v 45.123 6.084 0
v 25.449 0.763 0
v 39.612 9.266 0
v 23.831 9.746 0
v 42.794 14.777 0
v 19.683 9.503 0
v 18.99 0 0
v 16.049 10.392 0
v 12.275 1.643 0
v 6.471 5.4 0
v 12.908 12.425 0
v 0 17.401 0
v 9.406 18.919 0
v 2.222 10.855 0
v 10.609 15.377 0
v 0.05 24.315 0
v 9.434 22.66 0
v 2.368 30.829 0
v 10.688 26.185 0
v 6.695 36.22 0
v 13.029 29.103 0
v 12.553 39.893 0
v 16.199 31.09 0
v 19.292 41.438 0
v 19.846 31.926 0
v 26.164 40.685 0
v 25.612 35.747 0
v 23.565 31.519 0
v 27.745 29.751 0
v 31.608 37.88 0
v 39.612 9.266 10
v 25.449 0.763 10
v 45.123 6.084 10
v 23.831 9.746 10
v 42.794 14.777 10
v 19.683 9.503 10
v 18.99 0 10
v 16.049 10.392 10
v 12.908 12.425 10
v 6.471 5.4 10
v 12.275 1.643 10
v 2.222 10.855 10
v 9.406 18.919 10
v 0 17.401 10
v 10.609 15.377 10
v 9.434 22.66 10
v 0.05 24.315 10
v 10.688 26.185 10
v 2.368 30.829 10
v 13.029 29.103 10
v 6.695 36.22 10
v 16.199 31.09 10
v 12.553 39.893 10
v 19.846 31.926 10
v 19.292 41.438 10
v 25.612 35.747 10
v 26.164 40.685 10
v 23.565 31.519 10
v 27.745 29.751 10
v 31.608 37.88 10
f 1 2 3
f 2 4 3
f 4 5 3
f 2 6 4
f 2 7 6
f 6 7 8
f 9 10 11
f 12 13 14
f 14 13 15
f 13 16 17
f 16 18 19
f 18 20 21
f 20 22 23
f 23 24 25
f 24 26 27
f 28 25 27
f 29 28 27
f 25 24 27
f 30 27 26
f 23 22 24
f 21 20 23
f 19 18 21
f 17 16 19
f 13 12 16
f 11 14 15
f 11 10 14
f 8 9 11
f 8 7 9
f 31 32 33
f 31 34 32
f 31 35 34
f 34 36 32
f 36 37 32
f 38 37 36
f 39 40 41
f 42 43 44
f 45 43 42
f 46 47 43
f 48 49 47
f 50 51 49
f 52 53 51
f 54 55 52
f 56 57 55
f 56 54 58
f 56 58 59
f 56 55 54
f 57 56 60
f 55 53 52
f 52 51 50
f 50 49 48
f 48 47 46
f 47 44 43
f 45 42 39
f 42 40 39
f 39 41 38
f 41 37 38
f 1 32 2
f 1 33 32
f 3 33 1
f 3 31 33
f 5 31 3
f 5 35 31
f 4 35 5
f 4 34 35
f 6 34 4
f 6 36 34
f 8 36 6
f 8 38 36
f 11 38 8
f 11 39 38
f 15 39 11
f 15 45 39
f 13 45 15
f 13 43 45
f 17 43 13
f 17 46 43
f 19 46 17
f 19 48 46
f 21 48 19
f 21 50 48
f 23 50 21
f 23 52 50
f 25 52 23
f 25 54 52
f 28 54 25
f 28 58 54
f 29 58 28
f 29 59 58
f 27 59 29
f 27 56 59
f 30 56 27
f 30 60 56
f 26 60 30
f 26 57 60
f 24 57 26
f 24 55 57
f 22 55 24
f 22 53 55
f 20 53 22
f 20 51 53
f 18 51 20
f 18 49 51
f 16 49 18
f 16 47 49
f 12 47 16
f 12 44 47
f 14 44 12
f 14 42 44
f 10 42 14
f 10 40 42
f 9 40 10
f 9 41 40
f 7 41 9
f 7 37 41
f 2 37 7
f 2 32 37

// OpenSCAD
$fn = 32;

// ----------------------------------------------------------------------
// Eye lug: ring_tail, 10 mm thick
// ----------------------------------------------------------------------

// --- parameters (mm) ---
profile_height = 10;      // extrusion height
profile_points = 30;      // points of the closed outline

profile = [[25.612, 35.747], [31.608, 37.88], [26.164, 40.685], [19.292, 41.438], [12.553, 39.893], [6.695, 36.22], [2.368, 30.829], [0.05, 24.315], [0, 17.401], [2.222, 10.855], [6.471, 5.4], [12.275, 1.643], [18.99, 0], [25.449, 0.763], [45.123, 6.084], [39.612, 9.266], [42.794, 14.777], [23.831, 9.746], [19.683, 9.503], [16.049, 10.392], [12.908, 12.425], [10.609, 15.377], [9.406, 18.919], [9.434, 22.66], [10.688, 26.185], [13.029, 29.103], [16.199, 31.09], [19.846, 31.926], [23.565, 31.519], [27.745, 29.751]];  // single closed polygon, 30 points, counter clockwise

// --- the one profile operation ---
linear_extrude(height = profile_height) polygon(points = profile);
